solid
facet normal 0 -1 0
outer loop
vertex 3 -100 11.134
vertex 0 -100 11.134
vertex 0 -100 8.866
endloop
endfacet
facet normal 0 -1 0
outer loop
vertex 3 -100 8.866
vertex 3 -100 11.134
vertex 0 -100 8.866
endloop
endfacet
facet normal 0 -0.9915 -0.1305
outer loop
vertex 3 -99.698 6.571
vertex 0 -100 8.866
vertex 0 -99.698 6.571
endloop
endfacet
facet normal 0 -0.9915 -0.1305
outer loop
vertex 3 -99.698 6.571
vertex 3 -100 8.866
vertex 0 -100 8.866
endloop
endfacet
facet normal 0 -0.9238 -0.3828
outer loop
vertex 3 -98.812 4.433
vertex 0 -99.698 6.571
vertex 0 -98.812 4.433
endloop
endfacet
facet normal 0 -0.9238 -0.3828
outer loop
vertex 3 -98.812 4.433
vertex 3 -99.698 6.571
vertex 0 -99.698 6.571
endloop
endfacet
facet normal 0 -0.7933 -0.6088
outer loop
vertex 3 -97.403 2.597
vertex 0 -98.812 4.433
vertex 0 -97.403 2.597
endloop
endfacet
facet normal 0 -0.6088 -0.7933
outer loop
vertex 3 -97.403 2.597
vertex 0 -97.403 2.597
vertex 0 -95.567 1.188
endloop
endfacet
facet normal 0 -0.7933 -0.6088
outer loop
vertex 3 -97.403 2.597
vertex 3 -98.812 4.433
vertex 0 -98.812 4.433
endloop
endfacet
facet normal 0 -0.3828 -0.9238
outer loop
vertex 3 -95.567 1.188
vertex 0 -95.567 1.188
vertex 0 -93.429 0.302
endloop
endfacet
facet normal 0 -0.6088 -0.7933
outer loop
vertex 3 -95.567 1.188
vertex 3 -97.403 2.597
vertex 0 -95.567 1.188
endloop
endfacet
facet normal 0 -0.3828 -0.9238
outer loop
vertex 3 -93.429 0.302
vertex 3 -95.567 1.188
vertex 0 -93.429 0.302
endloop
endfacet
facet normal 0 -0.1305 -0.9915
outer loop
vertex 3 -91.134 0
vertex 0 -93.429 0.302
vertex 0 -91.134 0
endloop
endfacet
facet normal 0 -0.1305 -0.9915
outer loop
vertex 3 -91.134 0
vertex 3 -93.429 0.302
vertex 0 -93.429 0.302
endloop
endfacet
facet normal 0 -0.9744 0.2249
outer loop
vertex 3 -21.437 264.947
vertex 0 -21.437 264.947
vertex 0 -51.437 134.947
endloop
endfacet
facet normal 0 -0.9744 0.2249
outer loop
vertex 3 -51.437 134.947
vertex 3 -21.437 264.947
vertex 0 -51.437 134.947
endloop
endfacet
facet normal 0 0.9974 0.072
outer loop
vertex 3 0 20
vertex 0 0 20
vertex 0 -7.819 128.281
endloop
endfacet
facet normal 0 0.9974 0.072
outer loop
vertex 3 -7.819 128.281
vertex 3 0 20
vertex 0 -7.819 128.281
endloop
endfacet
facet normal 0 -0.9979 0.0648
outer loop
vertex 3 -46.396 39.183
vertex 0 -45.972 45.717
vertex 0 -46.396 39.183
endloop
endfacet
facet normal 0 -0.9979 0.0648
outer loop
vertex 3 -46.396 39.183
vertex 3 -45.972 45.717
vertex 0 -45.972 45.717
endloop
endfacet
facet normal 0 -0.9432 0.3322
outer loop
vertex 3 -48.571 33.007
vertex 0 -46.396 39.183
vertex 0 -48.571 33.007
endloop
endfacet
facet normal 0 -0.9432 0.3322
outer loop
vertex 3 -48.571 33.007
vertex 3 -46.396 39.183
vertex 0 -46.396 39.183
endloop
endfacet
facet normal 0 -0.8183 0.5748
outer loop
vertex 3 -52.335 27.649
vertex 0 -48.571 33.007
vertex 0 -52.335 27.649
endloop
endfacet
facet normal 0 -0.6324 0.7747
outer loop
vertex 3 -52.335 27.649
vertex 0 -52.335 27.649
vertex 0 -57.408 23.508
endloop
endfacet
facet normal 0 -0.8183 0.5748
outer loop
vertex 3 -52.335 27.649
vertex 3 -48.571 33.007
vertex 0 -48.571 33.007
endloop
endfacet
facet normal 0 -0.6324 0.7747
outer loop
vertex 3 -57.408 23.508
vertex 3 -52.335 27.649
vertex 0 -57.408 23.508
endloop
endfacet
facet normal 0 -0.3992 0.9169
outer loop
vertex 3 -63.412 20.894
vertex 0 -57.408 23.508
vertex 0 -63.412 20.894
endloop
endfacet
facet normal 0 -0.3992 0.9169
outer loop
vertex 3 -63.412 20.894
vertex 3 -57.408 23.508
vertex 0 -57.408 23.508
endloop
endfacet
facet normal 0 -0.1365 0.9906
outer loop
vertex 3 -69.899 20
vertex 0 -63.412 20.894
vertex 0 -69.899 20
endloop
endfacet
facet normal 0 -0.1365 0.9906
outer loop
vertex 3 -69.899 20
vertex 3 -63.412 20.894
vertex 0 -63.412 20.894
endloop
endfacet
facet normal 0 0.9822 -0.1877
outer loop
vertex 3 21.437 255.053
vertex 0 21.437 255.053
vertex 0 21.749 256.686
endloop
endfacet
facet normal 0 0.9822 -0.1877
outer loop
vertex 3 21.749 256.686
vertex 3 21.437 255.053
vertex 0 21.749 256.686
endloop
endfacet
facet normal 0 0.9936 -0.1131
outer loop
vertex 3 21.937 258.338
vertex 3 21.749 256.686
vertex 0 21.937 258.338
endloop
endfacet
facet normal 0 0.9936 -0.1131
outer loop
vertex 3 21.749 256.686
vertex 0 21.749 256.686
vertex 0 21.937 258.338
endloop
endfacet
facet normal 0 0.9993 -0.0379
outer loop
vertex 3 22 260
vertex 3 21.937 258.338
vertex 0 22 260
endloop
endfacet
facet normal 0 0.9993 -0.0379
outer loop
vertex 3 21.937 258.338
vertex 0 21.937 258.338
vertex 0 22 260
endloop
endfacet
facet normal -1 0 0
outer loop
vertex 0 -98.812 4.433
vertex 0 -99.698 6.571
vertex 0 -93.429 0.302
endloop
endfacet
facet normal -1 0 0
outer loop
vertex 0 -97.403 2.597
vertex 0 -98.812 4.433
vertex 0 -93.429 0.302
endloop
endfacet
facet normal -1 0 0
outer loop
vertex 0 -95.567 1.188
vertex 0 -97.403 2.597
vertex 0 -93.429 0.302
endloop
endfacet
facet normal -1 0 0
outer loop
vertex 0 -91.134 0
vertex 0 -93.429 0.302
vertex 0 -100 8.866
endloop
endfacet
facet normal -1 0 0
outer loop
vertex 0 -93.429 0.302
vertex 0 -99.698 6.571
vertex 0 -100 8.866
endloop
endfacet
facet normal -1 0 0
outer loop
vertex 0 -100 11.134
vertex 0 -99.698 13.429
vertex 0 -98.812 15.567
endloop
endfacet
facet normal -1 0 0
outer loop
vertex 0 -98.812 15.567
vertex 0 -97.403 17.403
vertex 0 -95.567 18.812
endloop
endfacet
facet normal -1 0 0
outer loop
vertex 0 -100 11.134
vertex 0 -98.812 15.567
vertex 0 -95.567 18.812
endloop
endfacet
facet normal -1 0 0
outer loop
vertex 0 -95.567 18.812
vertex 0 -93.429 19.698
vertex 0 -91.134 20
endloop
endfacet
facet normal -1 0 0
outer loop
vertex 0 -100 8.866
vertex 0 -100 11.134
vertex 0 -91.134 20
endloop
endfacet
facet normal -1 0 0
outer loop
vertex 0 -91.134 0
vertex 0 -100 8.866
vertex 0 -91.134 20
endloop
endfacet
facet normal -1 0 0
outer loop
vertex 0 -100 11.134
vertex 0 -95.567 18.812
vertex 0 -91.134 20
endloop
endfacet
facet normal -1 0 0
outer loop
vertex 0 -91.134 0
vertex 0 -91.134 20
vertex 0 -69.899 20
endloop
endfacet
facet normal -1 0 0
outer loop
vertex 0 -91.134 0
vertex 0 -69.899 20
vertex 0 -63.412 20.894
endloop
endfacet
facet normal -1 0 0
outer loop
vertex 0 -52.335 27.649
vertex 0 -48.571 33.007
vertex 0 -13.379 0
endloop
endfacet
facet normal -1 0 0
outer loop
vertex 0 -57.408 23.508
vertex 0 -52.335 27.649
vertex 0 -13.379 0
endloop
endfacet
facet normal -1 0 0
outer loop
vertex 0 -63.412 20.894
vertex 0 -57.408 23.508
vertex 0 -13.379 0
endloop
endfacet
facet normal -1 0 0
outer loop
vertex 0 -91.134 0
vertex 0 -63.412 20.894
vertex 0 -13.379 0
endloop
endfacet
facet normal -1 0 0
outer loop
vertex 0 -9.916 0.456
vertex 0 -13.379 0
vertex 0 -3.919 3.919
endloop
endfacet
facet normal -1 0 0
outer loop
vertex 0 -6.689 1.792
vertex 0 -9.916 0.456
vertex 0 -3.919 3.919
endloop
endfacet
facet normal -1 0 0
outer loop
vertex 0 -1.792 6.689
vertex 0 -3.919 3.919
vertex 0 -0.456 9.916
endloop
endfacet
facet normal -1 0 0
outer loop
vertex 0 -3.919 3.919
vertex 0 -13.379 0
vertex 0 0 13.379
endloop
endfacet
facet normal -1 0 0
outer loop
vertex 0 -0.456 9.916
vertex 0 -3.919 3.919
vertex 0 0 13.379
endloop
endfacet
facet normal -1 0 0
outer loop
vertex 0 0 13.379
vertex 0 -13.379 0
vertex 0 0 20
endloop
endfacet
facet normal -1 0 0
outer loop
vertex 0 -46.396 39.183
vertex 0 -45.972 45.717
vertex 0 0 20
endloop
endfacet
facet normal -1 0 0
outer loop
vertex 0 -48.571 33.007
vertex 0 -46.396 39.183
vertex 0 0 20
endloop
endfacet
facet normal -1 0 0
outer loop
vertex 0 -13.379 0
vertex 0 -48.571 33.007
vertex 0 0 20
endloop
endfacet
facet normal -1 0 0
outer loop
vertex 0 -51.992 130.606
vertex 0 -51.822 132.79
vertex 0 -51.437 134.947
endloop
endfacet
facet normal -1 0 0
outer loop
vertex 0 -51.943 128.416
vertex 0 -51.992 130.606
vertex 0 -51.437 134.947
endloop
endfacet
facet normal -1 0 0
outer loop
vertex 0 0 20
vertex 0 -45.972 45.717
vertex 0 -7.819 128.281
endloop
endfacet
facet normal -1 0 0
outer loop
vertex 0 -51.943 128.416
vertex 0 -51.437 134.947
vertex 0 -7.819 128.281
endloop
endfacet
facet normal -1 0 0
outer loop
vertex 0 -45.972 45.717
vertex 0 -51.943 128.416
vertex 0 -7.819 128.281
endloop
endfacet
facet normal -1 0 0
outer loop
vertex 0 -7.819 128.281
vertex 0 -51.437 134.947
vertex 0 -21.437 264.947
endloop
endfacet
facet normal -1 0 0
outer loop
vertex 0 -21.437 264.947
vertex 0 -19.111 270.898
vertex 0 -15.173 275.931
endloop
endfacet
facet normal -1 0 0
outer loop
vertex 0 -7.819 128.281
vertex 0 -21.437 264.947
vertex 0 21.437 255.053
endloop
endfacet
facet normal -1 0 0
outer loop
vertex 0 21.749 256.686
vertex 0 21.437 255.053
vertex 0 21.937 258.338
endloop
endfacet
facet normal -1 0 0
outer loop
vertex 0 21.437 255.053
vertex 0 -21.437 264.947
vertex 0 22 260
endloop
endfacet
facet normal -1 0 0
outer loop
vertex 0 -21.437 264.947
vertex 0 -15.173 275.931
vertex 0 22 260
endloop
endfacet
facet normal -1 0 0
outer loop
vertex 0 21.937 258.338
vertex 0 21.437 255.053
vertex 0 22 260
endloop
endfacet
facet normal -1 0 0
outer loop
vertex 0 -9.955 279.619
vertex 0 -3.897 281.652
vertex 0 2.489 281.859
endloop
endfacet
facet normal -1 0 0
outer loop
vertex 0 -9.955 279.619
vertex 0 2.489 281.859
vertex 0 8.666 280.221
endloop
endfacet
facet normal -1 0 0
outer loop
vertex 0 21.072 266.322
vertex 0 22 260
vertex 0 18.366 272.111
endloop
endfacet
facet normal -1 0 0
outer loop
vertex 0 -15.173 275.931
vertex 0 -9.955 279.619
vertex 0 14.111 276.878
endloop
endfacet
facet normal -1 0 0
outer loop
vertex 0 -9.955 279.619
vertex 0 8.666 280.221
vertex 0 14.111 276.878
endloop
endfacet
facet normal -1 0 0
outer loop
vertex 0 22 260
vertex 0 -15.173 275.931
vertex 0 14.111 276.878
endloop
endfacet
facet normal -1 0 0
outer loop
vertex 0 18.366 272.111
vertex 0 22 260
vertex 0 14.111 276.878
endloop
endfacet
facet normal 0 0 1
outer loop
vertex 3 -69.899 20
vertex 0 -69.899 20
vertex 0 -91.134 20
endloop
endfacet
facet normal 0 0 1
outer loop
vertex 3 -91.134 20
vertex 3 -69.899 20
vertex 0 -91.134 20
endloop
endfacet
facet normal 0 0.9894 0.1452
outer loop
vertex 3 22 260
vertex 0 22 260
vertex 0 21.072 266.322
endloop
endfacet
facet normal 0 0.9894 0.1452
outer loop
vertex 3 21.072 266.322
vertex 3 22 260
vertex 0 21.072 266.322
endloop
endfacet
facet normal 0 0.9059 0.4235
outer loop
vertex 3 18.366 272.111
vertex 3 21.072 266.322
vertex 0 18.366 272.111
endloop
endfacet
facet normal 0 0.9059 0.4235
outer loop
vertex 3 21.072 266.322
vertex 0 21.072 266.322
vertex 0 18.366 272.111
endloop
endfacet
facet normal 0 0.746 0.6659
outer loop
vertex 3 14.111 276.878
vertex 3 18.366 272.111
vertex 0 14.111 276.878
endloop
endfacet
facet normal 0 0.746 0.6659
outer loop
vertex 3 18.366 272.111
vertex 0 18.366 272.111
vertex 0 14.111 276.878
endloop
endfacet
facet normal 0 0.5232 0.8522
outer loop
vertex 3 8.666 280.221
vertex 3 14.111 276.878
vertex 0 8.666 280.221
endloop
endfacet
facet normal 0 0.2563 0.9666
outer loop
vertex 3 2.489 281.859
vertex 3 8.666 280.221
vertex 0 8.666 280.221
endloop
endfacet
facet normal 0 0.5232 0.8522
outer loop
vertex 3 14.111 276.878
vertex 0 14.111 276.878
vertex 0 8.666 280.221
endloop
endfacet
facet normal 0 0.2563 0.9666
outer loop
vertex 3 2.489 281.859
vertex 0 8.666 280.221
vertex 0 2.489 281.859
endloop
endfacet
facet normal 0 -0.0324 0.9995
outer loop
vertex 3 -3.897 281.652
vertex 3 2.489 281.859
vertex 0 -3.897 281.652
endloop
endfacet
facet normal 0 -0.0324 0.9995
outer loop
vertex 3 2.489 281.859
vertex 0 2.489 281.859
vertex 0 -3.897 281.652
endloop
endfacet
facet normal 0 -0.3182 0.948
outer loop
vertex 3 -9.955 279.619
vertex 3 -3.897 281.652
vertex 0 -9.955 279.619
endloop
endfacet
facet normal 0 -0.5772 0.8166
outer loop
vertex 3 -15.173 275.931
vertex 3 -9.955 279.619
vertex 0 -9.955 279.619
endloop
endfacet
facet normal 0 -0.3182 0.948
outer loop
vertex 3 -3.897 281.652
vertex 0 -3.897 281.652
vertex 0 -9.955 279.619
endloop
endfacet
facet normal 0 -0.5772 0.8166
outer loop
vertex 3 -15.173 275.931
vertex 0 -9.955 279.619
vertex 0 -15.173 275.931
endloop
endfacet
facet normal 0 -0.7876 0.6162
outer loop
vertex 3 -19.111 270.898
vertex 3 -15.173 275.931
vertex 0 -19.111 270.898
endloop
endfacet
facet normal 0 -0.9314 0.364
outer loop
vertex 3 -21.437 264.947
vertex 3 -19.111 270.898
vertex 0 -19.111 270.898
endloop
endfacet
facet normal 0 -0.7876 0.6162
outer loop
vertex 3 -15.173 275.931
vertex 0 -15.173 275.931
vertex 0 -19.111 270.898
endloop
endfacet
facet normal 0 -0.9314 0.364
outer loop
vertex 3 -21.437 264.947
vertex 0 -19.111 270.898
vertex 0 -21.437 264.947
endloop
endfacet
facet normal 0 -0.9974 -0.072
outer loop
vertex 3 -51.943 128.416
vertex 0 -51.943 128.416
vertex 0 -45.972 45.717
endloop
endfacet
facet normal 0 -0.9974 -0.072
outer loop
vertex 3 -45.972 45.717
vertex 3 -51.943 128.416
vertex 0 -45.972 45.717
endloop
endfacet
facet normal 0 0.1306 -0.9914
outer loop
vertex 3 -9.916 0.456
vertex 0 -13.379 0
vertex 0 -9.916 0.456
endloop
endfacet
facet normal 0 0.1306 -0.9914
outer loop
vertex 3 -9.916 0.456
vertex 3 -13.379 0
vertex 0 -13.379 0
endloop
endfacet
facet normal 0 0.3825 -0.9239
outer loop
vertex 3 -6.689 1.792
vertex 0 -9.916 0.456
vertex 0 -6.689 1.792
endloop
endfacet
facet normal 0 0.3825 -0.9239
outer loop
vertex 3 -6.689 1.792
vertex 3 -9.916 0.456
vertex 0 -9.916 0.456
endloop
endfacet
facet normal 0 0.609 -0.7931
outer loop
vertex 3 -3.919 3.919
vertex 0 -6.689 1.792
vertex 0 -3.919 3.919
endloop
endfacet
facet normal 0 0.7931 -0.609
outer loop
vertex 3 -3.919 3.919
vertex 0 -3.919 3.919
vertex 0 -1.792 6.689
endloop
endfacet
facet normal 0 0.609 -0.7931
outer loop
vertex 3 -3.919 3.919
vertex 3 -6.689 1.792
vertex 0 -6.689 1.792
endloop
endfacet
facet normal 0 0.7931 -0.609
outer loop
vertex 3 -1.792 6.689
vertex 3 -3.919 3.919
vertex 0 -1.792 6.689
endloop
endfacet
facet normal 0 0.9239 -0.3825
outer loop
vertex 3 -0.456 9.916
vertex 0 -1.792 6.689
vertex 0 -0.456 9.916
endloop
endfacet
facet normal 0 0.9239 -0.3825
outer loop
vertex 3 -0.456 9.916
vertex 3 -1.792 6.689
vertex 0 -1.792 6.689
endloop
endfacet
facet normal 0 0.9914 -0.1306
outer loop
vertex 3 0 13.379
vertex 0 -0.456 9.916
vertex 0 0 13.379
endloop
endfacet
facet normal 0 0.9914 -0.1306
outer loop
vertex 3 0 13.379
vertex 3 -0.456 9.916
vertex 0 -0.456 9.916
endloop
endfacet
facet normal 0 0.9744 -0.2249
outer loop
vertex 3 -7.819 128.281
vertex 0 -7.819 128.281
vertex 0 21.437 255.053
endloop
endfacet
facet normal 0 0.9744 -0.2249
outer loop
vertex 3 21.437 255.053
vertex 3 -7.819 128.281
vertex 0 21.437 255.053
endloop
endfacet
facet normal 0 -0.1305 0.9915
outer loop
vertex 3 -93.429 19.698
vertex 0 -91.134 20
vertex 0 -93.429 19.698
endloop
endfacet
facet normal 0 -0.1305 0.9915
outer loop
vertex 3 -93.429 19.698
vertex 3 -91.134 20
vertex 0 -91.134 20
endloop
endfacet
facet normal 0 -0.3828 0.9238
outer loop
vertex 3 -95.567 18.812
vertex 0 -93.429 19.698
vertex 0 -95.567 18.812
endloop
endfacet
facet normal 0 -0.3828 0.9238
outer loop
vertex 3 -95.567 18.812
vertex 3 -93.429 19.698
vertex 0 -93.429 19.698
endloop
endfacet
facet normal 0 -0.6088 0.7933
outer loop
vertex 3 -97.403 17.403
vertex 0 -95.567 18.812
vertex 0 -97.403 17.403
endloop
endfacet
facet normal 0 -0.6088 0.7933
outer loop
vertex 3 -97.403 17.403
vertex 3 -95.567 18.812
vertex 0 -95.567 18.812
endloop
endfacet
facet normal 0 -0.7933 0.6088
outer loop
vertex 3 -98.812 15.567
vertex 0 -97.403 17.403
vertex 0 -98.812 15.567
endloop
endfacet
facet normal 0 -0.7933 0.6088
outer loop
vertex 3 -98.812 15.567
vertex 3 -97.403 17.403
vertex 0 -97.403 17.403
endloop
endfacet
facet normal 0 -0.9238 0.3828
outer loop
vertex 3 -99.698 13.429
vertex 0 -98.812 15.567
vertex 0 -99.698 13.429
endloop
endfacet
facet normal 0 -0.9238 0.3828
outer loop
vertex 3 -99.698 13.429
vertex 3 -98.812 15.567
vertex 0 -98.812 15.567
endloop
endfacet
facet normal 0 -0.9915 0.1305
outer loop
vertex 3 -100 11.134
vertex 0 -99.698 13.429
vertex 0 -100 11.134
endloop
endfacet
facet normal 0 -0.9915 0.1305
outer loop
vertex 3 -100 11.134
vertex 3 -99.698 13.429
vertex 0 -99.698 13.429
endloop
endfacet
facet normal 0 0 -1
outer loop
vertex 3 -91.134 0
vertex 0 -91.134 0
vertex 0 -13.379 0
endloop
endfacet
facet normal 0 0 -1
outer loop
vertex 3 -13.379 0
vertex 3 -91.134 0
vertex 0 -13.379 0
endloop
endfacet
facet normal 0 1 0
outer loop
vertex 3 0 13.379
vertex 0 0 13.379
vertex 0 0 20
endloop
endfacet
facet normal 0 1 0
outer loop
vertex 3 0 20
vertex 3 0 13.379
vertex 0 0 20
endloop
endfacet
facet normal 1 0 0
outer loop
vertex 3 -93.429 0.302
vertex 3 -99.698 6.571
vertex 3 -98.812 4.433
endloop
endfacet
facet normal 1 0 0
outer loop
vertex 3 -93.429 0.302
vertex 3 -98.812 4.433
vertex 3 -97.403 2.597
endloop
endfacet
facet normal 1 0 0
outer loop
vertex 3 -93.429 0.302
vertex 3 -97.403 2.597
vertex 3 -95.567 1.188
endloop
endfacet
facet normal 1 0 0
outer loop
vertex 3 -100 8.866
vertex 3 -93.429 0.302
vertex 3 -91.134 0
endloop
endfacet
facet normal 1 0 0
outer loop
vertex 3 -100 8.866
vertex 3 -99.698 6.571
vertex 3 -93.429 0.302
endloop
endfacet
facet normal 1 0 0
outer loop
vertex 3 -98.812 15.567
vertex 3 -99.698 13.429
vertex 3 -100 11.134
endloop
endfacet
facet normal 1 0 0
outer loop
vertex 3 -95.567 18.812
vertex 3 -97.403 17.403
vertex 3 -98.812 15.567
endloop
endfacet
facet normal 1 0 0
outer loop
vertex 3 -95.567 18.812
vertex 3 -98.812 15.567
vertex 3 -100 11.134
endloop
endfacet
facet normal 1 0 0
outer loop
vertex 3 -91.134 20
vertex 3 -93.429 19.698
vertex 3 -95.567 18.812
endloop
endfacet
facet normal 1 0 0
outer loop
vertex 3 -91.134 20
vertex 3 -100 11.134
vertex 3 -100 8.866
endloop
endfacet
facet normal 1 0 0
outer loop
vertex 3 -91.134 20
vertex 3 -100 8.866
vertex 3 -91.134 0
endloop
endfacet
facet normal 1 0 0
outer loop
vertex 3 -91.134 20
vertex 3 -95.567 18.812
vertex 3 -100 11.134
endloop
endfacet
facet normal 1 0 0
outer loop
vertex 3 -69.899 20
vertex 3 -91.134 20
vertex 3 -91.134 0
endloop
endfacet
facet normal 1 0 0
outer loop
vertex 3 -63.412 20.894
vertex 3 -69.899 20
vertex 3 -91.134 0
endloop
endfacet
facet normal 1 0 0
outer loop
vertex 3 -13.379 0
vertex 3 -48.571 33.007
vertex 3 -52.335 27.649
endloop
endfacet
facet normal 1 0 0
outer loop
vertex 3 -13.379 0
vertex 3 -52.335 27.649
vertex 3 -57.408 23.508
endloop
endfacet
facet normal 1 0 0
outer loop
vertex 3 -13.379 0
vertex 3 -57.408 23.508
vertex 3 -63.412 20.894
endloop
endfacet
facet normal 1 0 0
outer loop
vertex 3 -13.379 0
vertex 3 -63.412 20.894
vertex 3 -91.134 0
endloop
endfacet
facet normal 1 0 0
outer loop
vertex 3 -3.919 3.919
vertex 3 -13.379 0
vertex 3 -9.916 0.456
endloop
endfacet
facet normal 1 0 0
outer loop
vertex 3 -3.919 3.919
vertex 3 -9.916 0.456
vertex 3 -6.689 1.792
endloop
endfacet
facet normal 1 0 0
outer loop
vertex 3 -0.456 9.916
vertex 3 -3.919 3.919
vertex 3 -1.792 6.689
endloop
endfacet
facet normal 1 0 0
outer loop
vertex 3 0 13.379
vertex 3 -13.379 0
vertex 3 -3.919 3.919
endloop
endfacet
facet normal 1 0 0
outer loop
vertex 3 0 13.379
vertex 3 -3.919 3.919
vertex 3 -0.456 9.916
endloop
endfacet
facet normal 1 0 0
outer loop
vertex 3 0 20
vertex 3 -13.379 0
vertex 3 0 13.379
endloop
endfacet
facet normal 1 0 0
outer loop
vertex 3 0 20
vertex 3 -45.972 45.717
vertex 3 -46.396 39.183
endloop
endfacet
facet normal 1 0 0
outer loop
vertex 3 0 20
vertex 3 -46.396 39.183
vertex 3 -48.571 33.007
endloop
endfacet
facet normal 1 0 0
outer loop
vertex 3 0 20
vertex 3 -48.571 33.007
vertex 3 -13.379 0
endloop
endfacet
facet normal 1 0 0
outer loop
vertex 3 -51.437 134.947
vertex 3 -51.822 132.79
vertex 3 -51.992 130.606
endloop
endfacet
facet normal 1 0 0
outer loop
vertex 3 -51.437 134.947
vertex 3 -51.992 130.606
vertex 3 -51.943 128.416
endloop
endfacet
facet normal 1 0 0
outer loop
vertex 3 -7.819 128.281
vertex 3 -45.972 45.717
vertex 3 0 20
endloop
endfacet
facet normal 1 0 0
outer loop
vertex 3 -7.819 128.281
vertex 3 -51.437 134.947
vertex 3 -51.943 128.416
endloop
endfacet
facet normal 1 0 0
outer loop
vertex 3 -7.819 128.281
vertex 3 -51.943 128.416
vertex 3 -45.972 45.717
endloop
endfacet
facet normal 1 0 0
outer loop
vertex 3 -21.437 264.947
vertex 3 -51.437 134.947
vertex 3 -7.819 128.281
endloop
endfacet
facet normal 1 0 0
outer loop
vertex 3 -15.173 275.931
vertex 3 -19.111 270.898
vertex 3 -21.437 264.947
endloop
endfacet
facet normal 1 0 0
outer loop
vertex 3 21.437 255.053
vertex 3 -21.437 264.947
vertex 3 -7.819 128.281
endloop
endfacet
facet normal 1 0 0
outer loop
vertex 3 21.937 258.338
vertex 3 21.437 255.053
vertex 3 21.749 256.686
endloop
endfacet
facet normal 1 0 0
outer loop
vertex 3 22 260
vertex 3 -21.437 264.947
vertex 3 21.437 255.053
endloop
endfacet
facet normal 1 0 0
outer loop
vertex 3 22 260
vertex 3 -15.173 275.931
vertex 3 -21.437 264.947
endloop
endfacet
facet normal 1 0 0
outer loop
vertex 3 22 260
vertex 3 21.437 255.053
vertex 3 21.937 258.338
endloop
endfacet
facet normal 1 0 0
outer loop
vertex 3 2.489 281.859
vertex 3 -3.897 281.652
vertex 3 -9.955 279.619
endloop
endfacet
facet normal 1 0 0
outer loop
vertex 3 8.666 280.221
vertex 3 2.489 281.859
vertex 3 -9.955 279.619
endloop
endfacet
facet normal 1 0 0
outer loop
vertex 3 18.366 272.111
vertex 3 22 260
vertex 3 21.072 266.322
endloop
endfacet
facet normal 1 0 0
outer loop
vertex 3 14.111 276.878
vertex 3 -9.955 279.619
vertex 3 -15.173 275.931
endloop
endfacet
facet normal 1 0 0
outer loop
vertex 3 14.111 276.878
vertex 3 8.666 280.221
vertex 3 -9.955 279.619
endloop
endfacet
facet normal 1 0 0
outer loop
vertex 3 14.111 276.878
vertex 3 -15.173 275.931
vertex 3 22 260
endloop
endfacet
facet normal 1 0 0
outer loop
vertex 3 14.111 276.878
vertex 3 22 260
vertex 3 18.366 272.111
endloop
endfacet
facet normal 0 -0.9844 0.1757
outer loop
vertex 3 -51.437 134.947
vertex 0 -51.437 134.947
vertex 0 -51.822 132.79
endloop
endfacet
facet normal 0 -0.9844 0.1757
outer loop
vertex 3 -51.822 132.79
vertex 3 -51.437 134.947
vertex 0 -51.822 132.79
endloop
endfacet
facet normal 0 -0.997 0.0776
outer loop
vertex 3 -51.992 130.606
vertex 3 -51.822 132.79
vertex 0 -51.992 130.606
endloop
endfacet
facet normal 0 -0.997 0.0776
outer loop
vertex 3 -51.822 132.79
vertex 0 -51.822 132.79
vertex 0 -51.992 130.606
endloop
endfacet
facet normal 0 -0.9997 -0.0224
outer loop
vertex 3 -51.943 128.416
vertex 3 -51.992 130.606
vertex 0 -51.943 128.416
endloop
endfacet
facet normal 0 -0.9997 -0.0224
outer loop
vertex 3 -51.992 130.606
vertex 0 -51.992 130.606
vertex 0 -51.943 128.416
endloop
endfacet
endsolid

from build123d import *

# Parameters (mm, degrees)
F1_DEPTH = 3
F2_R     = 23.9895203097
F3_R     = 8.8655957544
F4_R     = 13.3788231565


with BuildPart() as f1:
    # F0 (on Right) → F1 (new body)
    with BuildSketch(Plane.YZ):
        with BuildLine():
            ThreePointArc((21.4366063053, 255.0530908526), (21.8586977965, 257.5105561581), (22, 260))
            ThreePointArc((22, 260), (2.4894438419, 281.8586977965), (-21.4366063053, 264.9469091474))
            ThreePointArc((-21.4366063053, 264.9469091474), (-4.9469091474, 238.5633936947), (21.4366063053, 255.0530908526))
        make_face()
        with BuildLine():
            ThreePointArc((21.4366063053, 255.0530908526), (-4.9469091474, 238.5633936947), (-21.4366063053, 264.9469091474))
            Line((-21.4366063053, 264.9469091474), (-51.4366063053, 134.9469091474))
            ThreePointArc((-51.4366063053, 134.9469091474), (-28.2998058213, 151.9342047897), (-8.0571283842, 131.5844195316))
            Line((-8.0571283842, 131.5844195316), (-7.8185739981, 128.2806428715))
            Line((-7.8185739981, 128.2806428715), (21.4366063053, 255.0530908526))
        make_face()
        with BuildLine():
            ThreePointArc((-8.0571283842, 131.5844195316), (-28.2998058213, 151.9342047897), (-51.4366063053, 134.9469091474))
            ThreePointArc((-51.4366063053, 134.9469091474), (-51.9342047897, 131.7001941787), (-51.9428716158, 128.4155804684))
            ThreePointArc((-51.9428716158, 128.4155804684), (-31.7001941787, 108.0657952103), (-8.5633936947, 125.0530908526))
            ThreePointArc((-8.5633936947, 125.0530908526), (-8.1413022035, 127.5105561581), (-8, 130))
            ThreePointArc((-8, 130), (-8.0142867349, 130.7927245588), (-8.0571283842, 131.5844195316))
        make_face()
        with BuildLine():
            Line((-8.5633936947, 125.0530908526), (-7.8185739981, 128.2806428715))
            Line((-7.8185739981, 128.2806428715), (-8.0571283842, 131.5844195316))
            ThreePointArc((-8.0571283842, 131.5844195316), (-8.0142867349, 130.7927245588), (-8, 130))
            ThreePointArc((-8, 130), (-8.1413022035, 127.5105561581), (-8.5633936947, 125.0530908526))
        make_face()
        with BuildLine():
            Line((0, 20), (-7.8185739981, 128.2806428715))
            Line((-7.8185739981, 128.2806428715), (-8.5633936947, 125.0530908526))
            ThreePointArc((-8.5633936947, 125.0530908526), (-31.7001941787, 108.0657952103), (-51.9428716158, 128.4155804684))
            Line((-51.9428716158, 128.4155804684), (-44.1145542365, 20))
            Line((-44.1145542365, 20), (0, 20))
        make_face()
        Polygon((0, 0), (0, 20), (-44.1145542365, 20), (-100, 20), (-100, 0), align=None)
    extrude(amount=F1_DEPTH)

    # F2
    f2_edges = [f1.edges().sort_by_distance(p)[0] for p in [
        (1.5, -44.114554, 20),
    ]]
    fillet(f2_edges, radius=F2_R)

    # F3
    f3_edges = [f1.edges().sort_by_distance(p)[0] for p in [
        (1.5, -100, 20),
        (1.5, -100, 0),
    ]]
    fillet(f3_edges, radius=F3_R)

    # F4
    f4_edges = [f1.edges().sort_by_distance(p)[0] for p in [
        (1.5, 0, 0),
    ]]
    fillet(f4_edges, radius=F4_R)


solid = f1.part
